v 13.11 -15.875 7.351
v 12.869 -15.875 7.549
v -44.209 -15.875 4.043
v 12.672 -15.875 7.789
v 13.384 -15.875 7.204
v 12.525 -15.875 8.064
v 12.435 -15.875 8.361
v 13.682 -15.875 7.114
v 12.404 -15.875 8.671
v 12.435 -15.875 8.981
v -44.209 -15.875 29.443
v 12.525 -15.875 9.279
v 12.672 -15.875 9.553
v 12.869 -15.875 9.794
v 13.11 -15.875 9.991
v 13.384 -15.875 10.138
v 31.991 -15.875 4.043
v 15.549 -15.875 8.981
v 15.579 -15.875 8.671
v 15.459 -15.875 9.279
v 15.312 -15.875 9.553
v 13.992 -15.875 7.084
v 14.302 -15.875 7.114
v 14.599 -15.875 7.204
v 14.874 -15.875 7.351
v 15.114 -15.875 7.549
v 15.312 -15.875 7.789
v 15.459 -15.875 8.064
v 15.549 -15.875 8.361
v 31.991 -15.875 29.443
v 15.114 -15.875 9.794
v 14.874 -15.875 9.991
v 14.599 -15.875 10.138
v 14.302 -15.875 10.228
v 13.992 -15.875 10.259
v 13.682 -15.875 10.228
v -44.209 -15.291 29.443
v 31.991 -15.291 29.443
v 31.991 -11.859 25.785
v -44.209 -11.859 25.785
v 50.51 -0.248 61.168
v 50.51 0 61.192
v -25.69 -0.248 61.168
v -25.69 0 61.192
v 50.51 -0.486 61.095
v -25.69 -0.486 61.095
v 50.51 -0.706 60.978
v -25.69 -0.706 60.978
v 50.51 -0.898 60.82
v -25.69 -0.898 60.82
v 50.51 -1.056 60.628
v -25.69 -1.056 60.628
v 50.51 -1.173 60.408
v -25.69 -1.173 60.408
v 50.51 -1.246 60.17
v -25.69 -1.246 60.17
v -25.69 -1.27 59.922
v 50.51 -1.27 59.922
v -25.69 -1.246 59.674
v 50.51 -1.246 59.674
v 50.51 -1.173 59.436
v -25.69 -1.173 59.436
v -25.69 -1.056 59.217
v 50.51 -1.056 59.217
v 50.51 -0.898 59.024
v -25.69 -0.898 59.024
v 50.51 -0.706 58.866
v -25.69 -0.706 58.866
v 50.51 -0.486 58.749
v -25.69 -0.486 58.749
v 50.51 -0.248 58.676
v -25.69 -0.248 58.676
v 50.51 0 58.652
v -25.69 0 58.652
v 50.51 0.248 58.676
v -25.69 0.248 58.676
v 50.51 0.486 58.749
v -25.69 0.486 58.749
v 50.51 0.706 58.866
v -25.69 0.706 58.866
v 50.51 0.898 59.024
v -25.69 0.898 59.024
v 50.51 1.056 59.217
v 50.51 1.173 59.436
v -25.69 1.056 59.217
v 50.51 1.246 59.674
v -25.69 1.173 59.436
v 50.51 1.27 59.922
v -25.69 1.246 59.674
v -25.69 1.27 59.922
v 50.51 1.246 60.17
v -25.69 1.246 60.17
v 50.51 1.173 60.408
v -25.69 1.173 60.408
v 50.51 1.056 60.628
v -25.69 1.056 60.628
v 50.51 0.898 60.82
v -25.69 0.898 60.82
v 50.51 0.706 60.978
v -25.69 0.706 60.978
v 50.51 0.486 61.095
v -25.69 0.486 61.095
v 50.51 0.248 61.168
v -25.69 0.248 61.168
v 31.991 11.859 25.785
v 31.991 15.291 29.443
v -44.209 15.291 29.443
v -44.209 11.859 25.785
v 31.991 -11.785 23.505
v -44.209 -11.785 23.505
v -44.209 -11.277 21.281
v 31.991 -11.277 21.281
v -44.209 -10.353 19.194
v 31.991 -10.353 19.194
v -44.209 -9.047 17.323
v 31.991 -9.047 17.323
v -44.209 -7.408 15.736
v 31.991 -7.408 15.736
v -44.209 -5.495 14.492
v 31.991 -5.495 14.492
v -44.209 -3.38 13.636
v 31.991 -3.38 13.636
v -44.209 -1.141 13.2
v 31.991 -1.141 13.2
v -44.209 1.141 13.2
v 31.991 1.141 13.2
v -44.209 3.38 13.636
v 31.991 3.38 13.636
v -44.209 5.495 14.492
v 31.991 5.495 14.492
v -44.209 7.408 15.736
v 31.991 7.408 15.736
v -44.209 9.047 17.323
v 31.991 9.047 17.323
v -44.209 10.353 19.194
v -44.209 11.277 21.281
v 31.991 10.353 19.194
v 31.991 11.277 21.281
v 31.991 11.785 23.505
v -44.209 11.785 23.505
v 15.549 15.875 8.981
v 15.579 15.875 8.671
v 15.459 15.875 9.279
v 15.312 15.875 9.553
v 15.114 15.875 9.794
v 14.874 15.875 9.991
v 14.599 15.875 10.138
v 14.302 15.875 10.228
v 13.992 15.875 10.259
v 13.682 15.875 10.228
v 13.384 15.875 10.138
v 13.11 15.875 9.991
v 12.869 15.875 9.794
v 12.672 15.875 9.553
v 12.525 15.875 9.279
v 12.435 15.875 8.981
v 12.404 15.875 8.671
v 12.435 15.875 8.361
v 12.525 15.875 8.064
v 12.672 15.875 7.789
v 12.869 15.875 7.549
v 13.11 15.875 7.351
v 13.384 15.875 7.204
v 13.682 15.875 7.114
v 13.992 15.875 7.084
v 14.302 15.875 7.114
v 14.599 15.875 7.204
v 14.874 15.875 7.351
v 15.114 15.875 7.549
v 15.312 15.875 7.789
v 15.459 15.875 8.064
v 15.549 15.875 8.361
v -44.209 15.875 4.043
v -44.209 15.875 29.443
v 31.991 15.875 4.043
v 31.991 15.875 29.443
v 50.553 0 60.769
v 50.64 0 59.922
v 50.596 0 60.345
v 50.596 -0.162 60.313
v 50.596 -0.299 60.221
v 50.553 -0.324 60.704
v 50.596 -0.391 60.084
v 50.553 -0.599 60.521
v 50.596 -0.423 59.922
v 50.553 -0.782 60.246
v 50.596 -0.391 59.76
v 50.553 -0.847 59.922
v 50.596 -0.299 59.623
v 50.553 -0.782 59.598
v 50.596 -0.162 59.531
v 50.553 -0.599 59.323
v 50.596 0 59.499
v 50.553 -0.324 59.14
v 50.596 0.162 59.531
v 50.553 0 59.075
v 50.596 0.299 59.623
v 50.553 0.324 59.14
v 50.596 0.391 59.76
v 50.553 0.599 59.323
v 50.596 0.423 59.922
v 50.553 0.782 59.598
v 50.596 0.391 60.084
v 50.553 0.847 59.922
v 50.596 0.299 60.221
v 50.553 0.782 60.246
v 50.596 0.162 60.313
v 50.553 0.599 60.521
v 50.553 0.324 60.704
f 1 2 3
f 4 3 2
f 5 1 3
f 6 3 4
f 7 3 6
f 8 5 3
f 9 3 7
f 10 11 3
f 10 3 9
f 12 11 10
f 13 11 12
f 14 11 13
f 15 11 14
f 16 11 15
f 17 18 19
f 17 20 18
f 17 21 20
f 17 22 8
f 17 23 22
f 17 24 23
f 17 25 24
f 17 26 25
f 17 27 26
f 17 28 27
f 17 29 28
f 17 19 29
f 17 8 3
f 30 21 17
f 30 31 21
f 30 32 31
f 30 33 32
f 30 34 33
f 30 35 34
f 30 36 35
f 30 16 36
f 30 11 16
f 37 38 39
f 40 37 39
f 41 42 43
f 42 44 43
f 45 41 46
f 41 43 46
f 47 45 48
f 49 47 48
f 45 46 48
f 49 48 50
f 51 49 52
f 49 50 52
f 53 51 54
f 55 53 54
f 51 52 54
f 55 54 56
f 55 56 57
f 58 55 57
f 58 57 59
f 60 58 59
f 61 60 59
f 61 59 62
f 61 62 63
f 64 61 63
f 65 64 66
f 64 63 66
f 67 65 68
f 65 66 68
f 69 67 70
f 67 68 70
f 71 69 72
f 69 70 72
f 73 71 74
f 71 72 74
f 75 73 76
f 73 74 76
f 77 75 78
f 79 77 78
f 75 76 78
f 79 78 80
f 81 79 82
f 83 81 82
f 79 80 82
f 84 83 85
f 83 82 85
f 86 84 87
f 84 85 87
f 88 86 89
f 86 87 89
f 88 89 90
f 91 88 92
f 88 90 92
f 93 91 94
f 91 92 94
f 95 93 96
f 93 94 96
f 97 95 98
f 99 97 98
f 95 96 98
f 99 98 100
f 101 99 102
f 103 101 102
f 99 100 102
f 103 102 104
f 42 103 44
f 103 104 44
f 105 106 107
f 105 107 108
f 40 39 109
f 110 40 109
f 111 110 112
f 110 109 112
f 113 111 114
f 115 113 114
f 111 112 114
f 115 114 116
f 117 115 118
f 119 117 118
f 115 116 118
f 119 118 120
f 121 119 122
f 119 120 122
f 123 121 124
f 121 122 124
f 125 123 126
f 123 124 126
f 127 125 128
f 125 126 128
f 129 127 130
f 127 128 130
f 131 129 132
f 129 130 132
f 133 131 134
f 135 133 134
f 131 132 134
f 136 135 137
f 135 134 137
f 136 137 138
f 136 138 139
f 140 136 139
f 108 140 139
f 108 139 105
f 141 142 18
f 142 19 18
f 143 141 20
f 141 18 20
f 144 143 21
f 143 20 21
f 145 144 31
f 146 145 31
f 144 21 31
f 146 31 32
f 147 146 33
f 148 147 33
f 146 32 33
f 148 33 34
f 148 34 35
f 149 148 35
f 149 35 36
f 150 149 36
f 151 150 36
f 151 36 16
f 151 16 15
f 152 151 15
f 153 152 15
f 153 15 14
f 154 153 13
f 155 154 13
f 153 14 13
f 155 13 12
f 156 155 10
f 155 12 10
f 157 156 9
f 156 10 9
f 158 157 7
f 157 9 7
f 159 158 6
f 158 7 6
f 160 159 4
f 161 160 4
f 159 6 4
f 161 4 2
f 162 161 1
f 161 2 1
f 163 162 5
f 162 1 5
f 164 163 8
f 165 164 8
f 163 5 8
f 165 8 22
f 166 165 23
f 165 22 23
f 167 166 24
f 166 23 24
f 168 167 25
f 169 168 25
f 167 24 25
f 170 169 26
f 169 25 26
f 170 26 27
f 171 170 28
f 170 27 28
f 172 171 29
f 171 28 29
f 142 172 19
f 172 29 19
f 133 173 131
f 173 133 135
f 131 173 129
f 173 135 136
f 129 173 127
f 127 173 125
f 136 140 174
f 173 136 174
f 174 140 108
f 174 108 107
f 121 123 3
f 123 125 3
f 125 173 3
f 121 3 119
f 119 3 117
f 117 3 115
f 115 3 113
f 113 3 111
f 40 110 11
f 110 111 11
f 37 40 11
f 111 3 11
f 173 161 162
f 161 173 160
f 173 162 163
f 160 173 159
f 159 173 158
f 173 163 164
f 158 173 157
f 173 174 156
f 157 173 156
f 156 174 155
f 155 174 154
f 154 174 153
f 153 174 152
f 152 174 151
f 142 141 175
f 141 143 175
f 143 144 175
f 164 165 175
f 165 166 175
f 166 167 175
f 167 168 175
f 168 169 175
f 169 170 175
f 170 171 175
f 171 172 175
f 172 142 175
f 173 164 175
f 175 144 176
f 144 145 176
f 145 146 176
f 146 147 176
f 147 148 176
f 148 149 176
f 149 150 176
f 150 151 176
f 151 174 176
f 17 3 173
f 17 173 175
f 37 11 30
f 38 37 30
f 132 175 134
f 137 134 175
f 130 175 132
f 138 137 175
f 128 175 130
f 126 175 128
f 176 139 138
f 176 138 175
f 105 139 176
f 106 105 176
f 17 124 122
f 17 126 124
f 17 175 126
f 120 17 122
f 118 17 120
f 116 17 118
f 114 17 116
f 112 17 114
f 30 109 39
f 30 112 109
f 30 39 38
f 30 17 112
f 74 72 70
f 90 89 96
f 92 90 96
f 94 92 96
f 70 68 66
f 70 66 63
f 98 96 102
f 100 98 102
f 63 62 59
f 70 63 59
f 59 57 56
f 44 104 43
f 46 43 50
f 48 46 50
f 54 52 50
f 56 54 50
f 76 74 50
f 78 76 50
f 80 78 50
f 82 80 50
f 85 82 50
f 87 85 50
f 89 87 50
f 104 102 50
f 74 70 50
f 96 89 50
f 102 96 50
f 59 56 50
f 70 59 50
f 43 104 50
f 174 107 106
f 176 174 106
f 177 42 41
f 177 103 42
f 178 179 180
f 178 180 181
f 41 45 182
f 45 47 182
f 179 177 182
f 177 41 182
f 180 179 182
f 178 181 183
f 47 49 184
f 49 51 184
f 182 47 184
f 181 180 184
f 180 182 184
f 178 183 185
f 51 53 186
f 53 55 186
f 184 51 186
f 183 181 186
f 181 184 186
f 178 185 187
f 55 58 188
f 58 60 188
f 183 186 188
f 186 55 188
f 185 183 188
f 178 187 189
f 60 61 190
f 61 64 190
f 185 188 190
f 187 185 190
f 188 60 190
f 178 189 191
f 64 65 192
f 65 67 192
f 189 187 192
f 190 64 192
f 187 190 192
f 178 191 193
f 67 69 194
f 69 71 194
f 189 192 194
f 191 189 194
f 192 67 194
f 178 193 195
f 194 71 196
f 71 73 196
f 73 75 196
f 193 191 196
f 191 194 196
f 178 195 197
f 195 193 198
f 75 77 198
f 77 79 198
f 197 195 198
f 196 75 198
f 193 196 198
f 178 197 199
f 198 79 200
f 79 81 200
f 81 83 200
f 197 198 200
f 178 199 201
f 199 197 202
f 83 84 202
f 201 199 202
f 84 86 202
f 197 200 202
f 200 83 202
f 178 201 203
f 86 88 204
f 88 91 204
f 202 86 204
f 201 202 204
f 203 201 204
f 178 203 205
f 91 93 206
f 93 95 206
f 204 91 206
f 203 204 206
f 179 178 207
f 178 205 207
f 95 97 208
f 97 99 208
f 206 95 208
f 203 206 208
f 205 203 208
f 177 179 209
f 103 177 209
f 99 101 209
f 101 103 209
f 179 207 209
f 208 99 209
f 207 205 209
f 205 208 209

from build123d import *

# Parameters (mm, degrees)
F0_W        = 76.2
F0_H        = 25.4
F1_DEPTH    = 15.875
F2_R        = 11.8831121617
F3_DEPTH    = 76.2
F4_T1_DEPTH = 98.1986886944
F5_R        = 1.5875
F6_DEPTH    = 76.2


# Not quite as in the source:
# - a fillet or chamfer that OpenCascade refuses, or shapes differently, is made with other operations: its cross-section is extruded or revolved along the edge and cut away or added


with BuildPart() as f1:
    # F0 (on Front) → F1 (new body, symmetric)
    with BuildSketch(Plane.XZ):
        with Locations((-6.1091389507, 16.743282738)):
            Rectangle(F0_W, F0_H)
    extrude(amount=F1_DEPTH, both=True)

    # F2 (on Right) → F3 (cut, symmetric)
    with BuildSketch(Plane.YZ):
        with Locations((0, 25.0277593732)):
            Circle(F2_R)
    extrude(amount=F3_DEPTH, both=True, mode=Mode.SUBTRACT)

    # F4: chamfer of 5.08 on 2 edges, made by hand

    # F4_s2 → F4_t1 (cut)
    with BuildSketch(Plane.YZ.offset(-55.2084832979)):
        with BuildLine():
            Line((15.4295351274, 29.5914768875), (11.7199033612, 25.6372630168))
            Line((11.7199033612, 25.6372630168), (11.6185101073, 25.6307847395))
            ThreePointArc((11.6185101073, 25.6307847395), (11.5042711471, 27.5685809315), (10.937968324, 29.4055302395))
            Line((10.937968324, 29.4055302395), (11.0322938713, 29.544882738))
            ThreePointArc((11.0322938713, 29.544882738), (13.2309144993, 29.544882738), (15.4295351274, 29.6930768875))
            Line((15.4295351274, 29.6930768875), (15.4295351274, 29.5914768875))
        make_face()
        with BuildLine():
            Line((-15.4295351274, 29.5914768875), (-11.7199033612, 25.6372630168))
            Line((-11.7199033612, 25.6372630168), (-11.6185101073, 25.6307847395))
            ThreePointArc((-11.6185101073, 25.6307847395), (-11.5042711471, 27.5685809315), (-10.937968324, 29.4055302395))
            Line((-10.937968324, 29.4055302395), (-11.0322938713, 29.544882738))
            ThreePointArc((-11.0322938713, 29.544882738), (-13.2309144993, 29.544882738), (-15.4295351274, 29.6930768875))
            Line((-15.4295351274, 29.6930768875), (-15.4295351274, 29.5914768875))
        make_face()
    extrude(amount=F4_T1_DEPTH, mode=Mode.SUBTRACT)

    # F5 (on Front) → F6 (cut, symmetric)
    with BuildSketch(Plane.XZ):
        with Locations((13.9918969944, 8.6710350588)):
            Circle(F5_R)
    extrude(amount=F6_DEPTH, both=True, mode=Mode.SUBTRACT)


with BuildPart() as f8:
    # F7 (on Front) → F8 (revolve)
    with BuildSketch(Plane.XZ):
        Polygon((50.6395318134, 59.9220860207), (50.5097051469, 61.1920860207), (-25.6902948531, 61.1920860207), (-25.6902948531, 59.9220860207), align=None)
    revolve(axis=Axis((12.4746184802, 0, 59.9220860207), (1, 0, 0)))


solid = Compound([f1.part, f8.part])
